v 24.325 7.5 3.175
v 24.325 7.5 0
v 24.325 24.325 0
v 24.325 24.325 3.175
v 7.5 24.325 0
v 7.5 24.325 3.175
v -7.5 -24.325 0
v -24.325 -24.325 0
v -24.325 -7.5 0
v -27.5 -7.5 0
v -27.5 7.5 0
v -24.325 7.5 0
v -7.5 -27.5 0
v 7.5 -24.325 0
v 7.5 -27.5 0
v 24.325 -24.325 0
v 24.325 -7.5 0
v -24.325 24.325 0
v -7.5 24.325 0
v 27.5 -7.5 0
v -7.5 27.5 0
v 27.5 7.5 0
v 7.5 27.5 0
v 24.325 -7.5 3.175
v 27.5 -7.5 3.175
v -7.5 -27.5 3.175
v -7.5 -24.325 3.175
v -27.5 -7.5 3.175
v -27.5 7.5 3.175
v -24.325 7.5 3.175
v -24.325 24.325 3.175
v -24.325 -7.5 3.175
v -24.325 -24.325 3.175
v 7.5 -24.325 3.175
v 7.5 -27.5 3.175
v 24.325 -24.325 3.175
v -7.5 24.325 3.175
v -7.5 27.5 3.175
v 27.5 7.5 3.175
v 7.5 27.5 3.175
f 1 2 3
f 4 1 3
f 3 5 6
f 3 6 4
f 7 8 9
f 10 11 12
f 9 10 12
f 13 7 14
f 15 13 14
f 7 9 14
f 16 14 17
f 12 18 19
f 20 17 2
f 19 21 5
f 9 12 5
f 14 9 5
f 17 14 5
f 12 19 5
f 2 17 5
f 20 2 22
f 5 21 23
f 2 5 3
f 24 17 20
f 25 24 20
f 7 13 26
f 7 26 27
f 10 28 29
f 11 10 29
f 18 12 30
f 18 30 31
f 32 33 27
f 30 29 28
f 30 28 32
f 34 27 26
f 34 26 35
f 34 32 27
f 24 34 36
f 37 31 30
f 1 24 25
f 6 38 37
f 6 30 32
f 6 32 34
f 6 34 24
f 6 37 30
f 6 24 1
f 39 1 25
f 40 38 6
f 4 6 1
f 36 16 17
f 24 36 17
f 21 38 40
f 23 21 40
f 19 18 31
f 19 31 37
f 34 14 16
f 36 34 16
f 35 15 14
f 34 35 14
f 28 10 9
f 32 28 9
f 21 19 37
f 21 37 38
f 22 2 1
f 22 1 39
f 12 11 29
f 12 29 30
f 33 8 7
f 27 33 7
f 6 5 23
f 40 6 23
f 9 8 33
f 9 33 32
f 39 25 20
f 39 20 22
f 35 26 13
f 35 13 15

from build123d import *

# Parameters (mm, degrees)
F1_W     = 48.65
F1_H     = 48.65
F2_DEPTH = 3.175
F3_W     = 3.175
F3_H     = 15
F3_W_2   = 15
F3_H_2   = 3.175
F4_DEPTH = 3.175


with BuildPart() as f2:
    # F1 (on Top) → F2 (new body)
    with BuildSketch(Plane.XY):
        Rectangle(F1_W, F1_H)
    extrude(amount=F2_DEPTH)

    # F3 (on face) → F4 (join, through all)
    with BuildSketch(Plane.XY.offset(3.175)):
        with Locations((-25.9125, 0)):
            Rectangle(F3_W, F3_H)
        with Locations((0, 25.9125)):
            Rectangle(F3_W_2, F3_H_2)
        with Locations((0, -25.9125)):
            Rectangle(F3_W_2, F3_H_2)
        with Locations((25.9125, 0)):
            Rectangle(F3_W, F3_H)
    extrude(amount=-F4_DEPTH)


solid = f2.part
